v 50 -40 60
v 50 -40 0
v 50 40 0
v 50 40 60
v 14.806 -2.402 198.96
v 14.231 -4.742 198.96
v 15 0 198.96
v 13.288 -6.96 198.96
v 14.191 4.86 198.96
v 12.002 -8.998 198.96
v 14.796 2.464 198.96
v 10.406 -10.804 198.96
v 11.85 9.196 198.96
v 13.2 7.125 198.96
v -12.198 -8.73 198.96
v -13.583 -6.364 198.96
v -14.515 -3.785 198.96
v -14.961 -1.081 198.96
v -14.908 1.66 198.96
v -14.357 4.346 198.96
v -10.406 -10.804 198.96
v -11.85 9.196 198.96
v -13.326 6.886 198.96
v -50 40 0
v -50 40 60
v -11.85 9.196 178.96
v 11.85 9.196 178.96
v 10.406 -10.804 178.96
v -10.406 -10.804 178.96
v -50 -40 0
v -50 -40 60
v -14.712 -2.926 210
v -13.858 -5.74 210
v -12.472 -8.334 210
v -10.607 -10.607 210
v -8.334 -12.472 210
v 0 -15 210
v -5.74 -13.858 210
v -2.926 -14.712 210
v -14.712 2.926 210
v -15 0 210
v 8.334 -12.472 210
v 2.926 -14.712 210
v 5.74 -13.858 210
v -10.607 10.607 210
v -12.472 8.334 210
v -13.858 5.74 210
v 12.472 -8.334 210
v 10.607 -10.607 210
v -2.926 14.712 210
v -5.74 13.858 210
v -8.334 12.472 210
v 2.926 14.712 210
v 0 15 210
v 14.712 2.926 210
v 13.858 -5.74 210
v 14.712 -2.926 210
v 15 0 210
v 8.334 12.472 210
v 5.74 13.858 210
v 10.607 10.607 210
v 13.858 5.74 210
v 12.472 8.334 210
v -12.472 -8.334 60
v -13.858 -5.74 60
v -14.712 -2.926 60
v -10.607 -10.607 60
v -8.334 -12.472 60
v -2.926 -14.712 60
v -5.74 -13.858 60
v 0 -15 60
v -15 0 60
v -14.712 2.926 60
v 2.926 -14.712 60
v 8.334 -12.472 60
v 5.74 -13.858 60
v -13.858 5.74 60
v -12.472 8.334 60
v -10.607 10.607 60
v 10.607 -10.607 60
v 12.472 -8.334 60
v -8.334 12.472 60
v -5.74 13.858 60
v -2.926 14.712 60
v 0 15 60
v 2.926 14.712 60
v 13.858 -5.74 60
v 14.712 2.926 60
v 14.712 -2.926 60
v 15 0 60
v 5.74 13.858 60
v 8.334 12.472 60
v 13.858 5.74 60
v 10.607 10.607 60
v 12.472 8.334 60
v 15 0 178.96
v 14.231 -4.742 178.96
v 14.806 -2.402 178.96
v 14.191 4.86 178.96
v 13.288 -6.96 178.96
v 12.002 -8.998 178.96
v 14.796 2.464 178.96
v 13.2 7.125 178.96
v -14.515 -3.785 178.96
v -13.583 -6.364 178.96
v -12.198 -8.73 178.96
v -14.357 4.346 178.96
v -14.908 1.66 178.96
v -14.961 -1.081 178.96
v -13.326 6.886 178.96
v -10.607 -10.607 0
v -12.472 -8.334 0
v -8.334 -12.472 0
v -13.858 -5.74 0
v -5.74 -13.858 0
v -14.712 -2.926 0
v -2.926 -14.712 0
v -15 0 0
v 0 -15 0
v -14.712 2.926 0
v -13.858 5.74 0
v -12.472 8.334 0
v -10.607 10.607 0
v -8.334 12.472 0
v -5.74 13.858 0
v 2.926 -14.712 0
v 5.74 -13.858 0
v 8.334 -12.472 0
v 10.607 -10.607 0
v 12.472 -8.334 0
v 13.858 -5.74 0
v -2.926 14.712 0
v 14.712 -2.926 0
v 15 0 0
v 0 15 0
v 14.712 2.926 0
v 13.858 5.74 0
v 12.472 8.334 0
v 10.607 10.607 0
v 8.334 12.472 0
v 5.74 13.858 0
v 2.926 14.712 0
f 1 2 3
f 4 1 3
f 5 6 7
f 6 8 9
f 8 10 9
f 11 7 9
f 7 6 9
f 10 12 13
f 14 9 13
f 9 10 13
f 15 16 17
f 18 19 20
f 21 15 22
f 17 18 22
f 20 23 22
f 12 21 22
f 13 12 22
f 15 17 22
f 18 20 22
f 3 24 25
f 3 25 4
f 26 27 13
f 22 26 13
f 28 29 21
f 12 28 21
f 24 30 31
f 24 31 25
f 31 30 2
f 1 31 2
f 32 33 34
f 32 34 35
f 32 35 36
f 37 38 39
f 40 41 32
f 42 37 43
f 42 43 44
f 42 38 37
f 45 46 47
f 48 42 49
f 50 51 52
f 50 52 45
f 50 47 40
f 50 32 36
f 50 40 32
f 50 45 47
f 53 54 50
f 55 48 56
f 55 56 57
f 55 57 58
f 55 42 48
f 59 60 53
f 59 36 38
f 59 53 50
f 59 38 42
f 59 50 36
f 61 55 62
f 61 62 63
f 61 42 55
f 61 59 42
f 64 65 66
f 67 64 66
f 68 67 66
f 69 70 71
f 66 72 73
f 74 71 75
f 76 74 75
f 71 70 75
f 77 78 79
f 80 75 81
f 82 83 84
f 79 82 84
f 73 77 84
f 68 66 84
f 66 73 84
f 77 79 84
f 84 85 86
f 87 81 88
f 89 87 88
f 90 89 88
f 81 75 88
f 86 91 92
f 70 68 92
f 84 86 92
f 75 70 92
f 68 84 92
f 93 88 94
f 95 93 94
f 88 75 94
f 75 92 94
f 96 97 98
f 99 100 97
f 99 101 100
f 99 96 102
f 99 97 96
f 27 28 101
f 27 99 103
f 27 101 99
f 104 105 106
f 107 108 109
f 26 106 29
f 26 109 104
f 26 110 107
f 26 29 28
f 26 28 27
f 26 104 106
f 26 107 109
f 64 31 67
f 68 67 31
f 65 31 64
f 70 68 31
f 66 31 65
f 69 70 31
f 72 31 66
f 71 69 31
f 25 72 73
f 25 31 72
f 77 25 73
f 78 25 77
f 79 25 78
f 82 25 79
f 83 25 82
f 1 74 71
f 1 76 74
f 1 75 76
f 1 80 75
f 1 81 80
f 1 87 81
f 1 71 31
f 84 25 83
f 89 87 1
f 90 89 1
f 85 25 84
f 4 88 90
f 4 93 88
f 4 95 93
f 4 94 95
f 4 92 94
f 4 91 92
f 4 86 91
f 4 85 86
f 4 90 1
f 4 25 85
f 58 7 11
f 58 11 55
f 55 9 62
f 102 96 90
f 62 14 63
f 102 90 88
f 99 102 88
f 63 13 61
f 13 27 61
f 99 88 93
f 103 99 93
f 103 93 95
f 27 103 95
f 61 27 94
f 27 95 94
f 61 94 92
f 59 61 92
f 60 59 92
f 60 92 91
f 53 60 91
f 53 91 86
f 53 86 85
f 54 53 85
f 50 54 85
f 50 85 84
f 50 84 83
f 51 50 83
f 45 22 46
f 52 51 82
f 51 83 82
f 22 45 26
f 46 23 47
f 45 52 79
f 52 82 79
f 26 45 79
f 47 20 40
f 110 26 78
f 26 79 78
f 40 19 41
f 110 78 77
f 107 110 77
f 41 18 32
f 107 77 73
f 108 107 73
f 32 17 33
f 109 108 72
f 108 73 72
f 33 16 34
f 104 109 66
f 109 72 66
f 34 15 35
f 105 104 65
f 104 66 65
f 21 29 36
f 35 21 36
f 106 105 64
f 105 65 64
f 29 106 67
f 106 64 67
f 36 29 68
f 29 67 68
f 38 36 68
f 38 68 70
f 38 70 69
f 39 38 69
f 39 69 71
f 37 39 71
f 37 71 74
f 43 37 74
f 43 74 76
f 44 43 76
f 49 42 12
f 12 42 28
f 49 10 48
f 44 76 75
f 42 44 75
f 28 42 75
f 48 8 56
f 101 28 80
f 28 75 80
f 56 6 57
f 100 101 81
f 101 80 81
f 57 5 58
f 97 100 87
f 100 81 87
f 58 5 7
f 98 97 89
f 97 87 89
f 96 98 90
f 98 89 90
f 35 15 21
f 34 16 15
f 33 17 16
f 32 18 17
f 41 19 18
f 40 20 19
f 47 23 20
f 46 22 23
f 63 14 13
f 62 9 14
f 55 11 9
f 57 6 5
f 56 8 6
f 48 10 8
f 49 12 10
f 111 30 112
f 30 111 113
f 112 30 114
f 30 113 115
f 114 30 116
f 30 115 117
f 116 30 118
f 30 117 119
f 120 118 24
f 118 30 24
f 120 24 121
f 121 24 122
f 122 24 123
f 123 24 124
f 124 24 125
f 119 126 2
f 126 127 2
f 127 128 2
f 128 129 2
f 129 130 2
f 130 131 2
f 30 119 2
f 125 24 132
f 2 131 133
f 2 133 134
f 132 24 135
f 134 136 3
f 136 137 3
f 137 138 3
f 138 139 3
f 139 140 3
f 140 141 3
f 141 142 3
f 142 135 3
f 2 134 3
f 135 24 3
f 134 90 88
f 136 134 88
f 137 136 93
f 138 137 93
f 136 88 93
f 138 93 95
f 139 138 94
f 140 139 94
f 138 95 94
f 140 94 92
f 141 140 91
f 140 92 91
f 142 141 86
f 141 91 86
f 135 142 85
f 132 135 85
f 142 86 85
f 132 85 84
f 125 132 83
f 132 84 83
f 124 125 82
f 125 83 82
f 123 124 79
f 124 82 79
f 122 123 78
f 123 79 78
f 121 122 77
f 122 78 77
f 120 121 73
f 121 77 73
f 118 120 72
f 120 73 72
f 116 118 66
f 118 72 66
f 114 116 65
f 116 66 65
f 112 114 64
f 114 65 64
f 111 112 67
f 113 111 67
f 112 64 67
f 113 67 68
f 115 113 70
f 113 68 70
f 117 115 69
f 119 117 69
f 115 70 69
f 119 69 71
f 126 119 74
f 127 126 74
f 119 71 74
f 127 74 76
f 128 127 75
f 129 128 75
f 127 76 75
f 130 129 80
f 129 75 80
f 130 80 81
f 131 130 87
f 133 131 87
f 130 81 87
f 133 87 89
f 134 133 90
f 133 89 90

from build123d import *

# Parameters (mm, degrees)
F0_W          = 100
F0_H          = 80
F1_DEPTH      = 60
F2_R          = 15
F3_DEPTH      = 60
F4_R          = 15
F5_DEPTH      = 150
F6_W          = 20
F6_H          = 20
F7_DEPTH      = 25
F7_DEPTH_BACK = 25


with BuildPart() as f1:
    # F0 (on Top) → F1 (new body)
    with BuildSketch(Plane.XY):
        Rectangle(F0_W, F0_H)
    extrude(amount=F1_DEPTH)

    # F2 (on face) → F3 (cut, through all)
    with BuildSketch(Plane.XY.offset(60)):
        Circle(F2_R)
    extrude(amount=-F3_DEPTH, mode=Mode.SUBTRACT)


with BuildPart() as f5:
    # F4 (on face) → F5 (new body)
    with BuildSketch(Plane.XY.offset(60)):
        Circle(F4_R)
    extrude(amount=F5_DEPTH)

    # F6 (on Right) → F7 (cut, two sides)
    with BuildSketch(Plane.YZ) as f7_sk:
        with Locations((-0.8037427813, 188.9602637291)):
            Rectangle(F6_W, F6_H)
    extrude(amount=-F7_DEPTH, mode=Mode.SUBTRACT)
    extrude(f7_sk.sketch, amount=F7_DEPTH_BACK, mode=Mode.SUBTRACT)


solid = Compound([f1.part, f5.part])
